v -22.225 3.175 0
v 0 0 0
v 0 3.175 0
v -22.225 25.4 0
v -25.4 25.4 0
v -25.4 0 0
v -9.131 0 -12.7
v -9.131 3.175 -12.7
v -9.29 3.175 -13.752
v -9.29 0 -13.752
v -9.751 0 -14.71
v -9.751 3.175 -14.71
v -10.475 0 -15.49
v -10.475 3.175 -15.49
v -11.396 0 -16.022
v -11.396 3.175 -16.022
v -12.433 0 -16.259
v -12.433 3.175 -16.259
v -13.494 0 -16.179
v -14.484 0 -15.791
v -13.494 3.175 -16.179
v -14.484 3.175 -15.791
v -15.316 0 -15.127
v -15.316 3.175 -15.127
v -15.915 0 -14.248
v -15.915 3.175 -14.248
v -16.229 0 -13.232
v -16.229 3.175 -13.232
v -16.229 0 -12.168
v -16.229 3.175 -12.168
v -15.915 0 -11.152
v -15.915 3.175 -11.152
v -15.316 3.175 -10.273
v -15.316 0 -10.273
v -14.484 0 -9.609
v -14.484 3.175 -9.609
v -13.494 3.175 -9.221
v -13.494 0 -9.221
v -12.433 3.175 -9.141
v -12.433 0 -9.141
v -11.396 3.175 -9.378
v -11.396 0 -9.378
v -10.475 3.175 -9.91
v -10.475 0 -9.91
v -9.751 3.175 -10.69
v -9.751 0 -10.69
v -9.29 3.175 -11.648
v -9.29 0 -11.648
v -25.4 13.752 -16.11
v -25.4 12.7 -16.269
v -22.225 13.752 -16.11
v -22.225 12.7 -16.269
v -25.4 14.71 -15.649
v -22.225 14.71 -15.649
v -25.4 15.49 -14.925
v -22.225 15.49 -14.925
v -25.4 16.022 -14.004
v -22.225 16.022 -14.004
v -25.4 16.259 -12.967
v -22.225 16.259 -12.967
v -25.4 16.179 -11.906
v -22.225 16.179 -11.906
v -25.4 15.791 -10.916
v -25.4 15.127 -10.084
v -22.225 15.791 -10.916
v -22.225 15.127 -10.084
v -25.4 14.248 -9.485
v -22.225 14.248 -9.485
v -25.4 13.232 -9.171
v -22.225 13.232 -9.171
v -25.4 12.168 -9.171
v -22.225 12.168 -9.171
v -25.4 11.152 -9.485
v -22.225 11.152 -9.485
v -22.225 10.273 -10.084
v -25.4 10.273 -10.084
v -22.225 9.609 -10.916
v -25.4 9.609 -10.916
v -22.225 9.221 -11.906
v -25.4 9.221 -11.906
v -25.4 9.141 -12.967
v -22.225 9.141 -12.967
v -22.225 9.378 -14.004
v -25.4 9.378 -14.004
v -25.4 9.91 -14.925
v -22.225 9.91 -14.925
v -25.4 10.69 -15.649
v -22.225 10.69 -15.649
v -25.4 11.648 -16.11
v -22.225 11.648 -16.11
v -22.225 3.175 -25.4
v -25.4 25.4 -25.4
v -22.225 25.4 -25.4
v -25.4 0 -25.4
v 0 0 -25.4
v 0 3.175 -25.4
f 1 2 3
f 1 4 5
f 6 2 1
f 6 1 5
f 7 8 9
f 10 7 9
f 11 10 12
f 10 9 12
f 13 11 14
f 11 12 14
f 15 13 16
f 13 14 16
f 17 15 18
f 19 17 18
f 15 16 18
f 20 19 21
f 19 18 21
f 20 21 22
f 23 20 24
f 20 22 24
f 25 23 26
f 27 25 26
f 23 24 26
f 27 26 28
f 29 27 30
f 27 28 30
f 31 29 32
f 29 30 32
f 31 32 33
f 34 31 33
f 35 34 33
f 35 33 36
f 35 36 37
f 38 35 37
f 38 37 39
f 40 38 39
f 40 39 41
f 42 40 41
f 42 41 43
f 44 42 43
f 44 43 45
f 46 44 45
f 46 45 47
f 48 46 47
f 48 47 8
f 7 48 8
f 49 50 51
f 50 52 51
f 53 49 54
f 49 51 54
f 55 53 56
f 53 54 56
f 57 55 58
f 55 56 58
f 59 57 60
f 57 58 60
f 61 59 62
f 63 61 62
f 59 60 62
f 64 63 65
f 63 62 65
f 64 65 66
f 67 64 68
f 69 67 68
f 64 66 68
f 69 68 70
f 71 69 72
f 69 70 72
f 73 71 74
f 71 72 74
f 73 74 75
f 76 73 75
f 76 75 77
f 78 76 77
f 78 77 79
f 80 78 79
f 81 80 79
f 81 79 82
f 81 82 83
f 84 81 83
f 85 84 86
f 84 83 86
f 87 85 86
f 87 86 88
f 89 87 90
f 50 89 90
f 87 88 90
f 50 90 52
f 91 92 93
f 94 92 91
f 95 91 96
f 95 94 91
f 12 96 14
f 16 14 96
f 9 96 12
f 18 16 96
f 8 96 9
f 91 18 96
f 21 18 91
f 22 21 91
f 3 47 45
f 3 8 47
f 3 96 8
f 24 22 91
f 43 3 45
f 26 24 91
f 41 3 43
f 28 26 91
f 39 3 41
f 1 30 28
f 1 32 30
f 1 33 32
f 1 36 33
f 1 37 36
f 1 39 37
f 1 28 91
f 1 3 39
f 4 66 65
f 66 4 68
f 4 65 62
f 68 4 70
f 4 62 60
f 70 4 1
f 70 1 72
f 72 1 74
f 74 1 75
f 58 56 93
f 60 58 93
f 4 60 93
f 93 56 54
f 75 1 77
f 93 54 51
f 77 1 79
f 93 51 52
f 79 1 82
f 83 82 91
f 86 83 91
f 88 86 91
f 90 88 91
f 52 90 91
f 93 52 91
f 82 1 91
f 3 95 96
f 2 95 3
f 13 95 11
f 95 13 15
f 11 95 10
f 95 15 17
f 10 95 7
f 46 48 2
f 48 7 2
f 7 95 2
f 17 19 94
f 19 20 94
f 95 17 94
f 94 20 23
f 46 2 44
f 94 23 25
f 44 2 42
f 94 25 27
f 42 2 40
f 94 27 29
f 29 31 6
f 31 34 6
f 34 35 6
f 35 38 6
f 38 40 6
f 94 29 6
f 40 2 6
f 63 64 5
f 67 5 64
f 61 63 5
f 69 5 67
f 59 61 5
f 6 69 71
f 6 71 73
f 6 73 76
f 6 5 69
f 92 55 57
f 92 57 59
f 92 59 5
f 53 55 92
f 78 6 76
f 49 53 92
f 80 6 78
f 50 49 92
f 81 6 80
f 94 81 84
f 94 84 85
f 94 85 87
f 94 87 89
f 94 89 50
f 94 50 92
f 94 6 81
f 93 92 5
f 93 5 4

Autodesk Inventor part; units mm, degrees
ref_plane "YZ Plane" through (0, 0, 0) normal (1, 0, 0) x (0, 1, 0)
ref_plane "XZ Plane" through (0, 0, 0) normal (0, 1, 0) x (-1, 0, 0)
ref_plane "XY Plane" through (0, 0, 0) normal (0, 0, 1) x (1, 0, 0)
sketch "Sketch1" plane through (0, 0, 0) normal (0, 1, 0) x (-1, 0, 0)
  line L0 (0, 0) -> (25.4, 0)
  line L1 (25.4, 0) -> (25.4, -25.4)
  line L2 (25.4, -25.4) -> (0, -25.4)
  line L3 (0, -25.4) -> (0, 0)
  dimension "d0" = 25.4
  dimension "d1" = 25.4
extrude "Extrusion1" add sketch "Sketch1" along normal blind 3.175
sketch "Sketch2" plane through (0, 3.175, 0) normal (0, 1, 0) x (1, 0, 0)
  line L0 (-25.4, 25.4) -> (-25.4, 0) projected
  line L1 (-25.4, 0) -> (-22.225, 0)
  line L2 (-22.225, 0) -> (-22.225, 25.4)
  line L3 (-22.225, 25.4) -> (-25.4, 25.4)
  line L4 (-25.4, 25.4) -> (-25.4, 0)
  point P0 (0, 0)
  dimension "d4" = 3.175
  dimension "d5" = 25.4
extrude "Extrusion2" add sketch "Sketch2" along normal blind 22.225
sketch "Sketch3" plane through (0, 3.175, 0) normal (0, 1, 0) x (1, 0, 0)
  circle A0 centre (-12.7, 12.7) radius 3.5687
  line L0 (0, 25.4) -> (-22.225, 25.4) projected
  line L1 (0, 25.4) -> (0, 0) projected
  dimension "d8" = 7.1374
  dimension "d9" = 12.7
  dimension "d10" = 12.7
extrude "Extrusion3" cut sketch "Sketch3" against normal blind 22.225
sketch "Sketch4" plane through (-22.225, 3.175, 0) normal (1, 0, 0) x (0, 0, -1)
  circle A0 centre (12.7, 9.525) radius 3.5687
  line L0 (25.4, 0) -> (25.4, 22.225) projected
  line L1 (0, 22.225) -> (25.4, 22.225) projected
  point P0 (0, -3.175)
  dimension "d13" = 7.1374
  dimension "d14" = 12.7
  dimension "d15" = 12.7
extrude "Extrusion4" cut sketch "Sketch4" against normal blind 3.175
properties part number "Lbracket" material "Aluminum 6061"
